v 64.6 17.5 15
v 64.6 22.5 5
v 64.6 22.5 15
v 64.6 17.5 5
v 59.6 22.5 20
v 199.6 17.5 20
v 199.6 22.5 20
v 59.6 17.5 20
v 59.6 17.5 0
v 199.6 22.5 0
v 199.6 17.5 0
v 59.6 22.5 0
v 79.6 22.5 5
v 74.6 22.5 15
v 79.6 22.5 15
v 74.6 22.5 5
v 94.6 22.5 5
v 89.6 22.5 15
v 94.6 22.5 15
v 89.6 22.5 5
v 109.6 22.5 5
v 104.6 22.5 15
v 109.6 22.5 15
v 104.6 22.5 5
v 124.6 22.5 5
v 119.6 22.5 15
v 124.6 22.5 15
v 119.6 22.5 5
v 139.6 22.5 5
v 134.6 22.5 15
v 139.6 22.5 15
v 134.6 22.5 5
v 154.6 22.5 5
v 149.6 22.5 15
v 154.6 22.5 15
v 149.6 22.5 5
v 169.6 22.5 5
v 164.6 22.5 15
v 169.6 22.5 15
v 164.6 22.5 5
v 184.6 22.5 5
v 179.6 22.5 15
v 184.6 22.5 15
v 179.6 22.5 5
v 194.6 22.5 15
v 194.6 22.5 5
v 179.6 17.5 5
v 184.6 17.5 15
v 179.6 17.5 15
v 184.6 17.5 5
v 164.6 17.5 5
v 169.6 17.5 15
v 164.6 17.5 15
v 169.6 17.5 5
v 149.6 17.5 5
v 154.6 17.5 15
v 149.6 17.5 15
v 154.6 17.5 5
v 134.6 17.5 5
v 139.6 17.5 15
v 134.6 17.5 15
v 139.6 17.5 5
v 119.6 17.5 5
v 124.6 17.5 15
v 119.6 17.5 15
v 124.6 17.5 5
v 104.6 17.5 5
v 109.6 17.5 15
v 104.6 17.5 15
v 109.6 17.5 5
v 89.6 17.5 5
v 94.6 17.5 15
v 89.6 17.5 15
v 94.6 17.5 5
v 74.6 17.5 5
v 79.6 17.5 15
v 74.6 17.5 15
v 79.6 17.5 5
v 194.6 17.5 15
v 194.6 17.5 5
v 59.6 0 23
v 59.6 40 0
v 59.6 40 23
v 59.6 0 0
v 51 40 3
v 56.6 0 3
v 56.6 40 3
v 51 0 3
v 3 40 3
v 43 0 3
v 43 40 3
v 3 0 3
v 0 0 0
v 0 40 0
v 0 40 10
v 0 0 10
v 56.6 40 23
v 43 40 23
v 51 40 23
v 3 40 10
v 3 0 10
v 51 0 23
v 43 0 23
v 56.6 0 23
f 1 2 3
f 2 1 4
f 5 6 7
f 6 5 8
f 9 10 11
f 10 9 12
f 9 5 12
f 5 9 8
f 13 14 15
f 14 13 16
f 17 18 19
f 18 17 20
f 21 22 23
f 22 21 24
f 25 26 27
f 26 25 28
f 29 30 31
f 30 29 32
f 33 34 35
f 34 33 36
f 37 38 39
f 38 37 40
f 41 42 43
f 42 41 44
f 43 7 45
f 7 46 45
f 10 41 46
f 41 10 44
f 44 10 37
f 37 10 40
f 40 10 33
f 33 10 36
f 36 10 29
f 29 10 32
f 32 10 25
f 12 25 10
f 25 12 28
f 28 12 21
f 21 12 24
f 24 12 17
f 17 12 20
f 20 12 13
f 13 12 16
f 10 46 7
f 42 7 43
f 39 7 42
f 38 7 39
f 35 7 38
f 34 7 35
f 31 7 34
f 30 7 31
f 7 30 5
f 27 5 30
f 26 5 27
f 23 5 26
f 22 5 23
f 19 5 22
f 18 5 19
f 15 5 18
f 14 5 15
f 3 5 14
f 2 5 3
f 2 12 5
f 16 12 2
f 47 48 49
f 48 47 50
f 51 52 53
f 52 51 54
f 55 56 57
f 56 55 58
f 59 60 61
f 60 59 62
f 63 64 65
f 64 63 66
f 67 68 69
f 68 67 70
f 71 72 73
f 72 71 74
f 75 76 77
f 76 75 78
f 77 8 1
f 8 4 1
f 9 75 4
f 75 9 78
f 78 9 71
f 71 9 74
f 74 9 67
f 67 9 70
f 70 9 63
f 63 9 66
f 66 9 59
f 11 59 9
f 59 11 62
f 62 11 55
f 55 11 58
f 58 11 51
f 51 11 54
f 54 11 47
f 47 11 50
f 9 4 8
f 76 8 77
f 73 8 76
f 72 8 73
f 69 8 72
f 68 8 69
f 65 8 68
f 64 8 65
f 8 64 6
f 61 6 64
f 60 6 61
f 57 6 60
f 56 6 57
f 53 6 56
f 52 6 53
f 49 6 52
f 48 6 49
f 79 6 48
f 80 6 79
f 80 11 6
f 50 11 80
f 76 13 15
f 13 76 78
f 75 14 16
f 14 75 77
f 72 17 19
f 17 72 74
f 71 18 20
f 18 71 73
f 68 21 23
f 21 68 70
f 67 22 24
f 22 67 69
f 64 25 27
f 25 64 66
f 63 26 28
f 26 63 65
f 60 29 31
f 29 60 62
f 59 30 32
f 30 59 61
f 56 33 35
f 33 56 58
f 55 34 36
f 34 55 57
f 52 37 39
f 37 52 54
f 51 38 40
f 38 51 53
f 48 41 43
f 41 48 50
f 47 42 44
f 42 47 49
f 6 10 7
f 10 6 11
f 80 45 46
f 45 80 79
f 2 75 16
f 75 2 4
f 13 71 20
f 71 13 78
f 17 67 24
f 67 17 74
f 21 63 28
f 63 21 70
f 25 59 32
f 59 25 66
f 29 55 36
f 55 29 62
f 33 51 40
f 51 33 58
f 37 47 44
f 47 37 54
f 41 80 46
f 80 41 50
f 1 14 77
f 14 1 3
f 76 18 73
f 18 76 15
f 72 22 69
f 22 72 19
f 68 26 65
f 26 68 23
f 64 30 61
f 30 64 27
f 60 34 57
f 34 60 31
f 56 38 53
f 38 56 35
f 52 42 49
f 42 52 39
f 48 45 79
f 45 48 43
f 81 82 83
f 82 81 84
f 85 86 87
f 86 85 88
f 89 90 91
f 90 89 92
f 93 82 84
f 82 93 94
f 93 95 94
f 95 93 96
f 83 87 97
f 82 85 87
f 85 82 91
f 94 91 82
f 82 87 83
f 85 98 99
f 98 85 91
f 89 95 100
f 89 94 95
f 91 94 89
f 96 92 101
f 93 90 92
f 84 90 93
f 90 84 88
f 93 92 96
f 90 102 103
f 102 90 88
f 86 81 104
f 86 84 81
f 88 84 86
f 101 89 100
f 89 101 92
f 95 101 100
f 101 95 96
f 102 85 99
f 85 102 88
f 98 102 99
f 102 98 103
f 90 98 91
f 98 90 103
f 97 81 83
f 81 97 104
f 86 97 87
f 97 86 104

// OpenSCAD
/*

Copyright (c) 2014, Steven Presser
All rights reserved.

Redistribution and use in source and binary forms, with or without modification, are permitted provided that the following conditions are met:

1. Redistributions of source code must retain the above copyright notice, this list of conditions and the following disclaimer.

2. Redistributions in binary form must reproduce the above copyright notice, this list of conditions and the following disclaimer in the documentation and/or other materials provided with the distribution.

3. Neither Steven Presser nor the names of its contributors may be used to endorse or promote products derived from this software without specific prior written permission.

THIS SOFTWARE IS PROVIDED BY THE COPYRIGHT HOLDERS AND CONTRIBUTORS "AS IS" AND ANY EXPRESS OR IMPLIED WARRANTIES, INCLUDING, BUT NOT LIMITED TO, THE IMPLIED WARRANTIES OF MERCHANTABILITY AND FITNESS FOR A PARTICULAR PURPOSE ARE DISCLAIMED. IN NO EVENT SHALL THE COPYRIGHT HOLDER OR CONTRIBUTORS BE LIABLE FOR ANY DIRECT, INDIRECT, INCIDENTAL, SPECIAL, EXEMPLARY, OR CONSEQUENTIAL DAMAGES (INCLUDING, BUT NOT LIMITED TO, PROCUREMENT OF SUBSTITUTE GOODS OR SERVICES; LOSS OF USE, DATA, OR PROFITS; OR BUSINESS INTERRUPTION) HOWEVER CAUSED AND ON ANY THEORY OF LIABILITY, WHETHER IN CONTRACT, STRICT LIABILITY, OR TORT (INCLUDING NEGLIGENCE OR OTHERWISE) ARISING IN ANY WAY OUT OF THE USE OF THIS SOFTWARE, EVEN IF ADVISED OF THE POSSIBILITY OF SUCH DAMAGE.

*/

gapThick=8;
acryThick=5.6;
armThick=40;
armHeight=20;
armBackHeight=7;

wallThickness=3;
width=40;

beamLength=120;
beamThick=5;
beamHeight=20;

union() {
	cube([gapThick+acryThick+armThick+(2*wallThickness), width, wallThickness]);
	translate([0,0,wallThickness]) cube([wallThickness, width, armBackHeight]);
	translate([wallThickness+armThick,0,wallThickness]) cube([gapThick, width, armHeight]);
	translate([wallThickness+armThick+acryThick+gapThick,0,wallThickness]) cube([wallThickness, width, armHeight]);
	
	translate([(2*wallThickness)+armThick+acryThick+gapThick,width/2-beamThick/2,0]) {
		cube([beamLength+beamHeight, beamThick, beamThick]);
		translate([0,0, beamHeight-beamThick]) cube([beamLength+beamHeight, beamThick, beamThick]);
		for (x = [0:beamHeight-beamThick:beamLength+beamHeight]) {
			translate([x,0,0]) cube([beamThick,beamThick,beamHeight]);
		}
	}
}
